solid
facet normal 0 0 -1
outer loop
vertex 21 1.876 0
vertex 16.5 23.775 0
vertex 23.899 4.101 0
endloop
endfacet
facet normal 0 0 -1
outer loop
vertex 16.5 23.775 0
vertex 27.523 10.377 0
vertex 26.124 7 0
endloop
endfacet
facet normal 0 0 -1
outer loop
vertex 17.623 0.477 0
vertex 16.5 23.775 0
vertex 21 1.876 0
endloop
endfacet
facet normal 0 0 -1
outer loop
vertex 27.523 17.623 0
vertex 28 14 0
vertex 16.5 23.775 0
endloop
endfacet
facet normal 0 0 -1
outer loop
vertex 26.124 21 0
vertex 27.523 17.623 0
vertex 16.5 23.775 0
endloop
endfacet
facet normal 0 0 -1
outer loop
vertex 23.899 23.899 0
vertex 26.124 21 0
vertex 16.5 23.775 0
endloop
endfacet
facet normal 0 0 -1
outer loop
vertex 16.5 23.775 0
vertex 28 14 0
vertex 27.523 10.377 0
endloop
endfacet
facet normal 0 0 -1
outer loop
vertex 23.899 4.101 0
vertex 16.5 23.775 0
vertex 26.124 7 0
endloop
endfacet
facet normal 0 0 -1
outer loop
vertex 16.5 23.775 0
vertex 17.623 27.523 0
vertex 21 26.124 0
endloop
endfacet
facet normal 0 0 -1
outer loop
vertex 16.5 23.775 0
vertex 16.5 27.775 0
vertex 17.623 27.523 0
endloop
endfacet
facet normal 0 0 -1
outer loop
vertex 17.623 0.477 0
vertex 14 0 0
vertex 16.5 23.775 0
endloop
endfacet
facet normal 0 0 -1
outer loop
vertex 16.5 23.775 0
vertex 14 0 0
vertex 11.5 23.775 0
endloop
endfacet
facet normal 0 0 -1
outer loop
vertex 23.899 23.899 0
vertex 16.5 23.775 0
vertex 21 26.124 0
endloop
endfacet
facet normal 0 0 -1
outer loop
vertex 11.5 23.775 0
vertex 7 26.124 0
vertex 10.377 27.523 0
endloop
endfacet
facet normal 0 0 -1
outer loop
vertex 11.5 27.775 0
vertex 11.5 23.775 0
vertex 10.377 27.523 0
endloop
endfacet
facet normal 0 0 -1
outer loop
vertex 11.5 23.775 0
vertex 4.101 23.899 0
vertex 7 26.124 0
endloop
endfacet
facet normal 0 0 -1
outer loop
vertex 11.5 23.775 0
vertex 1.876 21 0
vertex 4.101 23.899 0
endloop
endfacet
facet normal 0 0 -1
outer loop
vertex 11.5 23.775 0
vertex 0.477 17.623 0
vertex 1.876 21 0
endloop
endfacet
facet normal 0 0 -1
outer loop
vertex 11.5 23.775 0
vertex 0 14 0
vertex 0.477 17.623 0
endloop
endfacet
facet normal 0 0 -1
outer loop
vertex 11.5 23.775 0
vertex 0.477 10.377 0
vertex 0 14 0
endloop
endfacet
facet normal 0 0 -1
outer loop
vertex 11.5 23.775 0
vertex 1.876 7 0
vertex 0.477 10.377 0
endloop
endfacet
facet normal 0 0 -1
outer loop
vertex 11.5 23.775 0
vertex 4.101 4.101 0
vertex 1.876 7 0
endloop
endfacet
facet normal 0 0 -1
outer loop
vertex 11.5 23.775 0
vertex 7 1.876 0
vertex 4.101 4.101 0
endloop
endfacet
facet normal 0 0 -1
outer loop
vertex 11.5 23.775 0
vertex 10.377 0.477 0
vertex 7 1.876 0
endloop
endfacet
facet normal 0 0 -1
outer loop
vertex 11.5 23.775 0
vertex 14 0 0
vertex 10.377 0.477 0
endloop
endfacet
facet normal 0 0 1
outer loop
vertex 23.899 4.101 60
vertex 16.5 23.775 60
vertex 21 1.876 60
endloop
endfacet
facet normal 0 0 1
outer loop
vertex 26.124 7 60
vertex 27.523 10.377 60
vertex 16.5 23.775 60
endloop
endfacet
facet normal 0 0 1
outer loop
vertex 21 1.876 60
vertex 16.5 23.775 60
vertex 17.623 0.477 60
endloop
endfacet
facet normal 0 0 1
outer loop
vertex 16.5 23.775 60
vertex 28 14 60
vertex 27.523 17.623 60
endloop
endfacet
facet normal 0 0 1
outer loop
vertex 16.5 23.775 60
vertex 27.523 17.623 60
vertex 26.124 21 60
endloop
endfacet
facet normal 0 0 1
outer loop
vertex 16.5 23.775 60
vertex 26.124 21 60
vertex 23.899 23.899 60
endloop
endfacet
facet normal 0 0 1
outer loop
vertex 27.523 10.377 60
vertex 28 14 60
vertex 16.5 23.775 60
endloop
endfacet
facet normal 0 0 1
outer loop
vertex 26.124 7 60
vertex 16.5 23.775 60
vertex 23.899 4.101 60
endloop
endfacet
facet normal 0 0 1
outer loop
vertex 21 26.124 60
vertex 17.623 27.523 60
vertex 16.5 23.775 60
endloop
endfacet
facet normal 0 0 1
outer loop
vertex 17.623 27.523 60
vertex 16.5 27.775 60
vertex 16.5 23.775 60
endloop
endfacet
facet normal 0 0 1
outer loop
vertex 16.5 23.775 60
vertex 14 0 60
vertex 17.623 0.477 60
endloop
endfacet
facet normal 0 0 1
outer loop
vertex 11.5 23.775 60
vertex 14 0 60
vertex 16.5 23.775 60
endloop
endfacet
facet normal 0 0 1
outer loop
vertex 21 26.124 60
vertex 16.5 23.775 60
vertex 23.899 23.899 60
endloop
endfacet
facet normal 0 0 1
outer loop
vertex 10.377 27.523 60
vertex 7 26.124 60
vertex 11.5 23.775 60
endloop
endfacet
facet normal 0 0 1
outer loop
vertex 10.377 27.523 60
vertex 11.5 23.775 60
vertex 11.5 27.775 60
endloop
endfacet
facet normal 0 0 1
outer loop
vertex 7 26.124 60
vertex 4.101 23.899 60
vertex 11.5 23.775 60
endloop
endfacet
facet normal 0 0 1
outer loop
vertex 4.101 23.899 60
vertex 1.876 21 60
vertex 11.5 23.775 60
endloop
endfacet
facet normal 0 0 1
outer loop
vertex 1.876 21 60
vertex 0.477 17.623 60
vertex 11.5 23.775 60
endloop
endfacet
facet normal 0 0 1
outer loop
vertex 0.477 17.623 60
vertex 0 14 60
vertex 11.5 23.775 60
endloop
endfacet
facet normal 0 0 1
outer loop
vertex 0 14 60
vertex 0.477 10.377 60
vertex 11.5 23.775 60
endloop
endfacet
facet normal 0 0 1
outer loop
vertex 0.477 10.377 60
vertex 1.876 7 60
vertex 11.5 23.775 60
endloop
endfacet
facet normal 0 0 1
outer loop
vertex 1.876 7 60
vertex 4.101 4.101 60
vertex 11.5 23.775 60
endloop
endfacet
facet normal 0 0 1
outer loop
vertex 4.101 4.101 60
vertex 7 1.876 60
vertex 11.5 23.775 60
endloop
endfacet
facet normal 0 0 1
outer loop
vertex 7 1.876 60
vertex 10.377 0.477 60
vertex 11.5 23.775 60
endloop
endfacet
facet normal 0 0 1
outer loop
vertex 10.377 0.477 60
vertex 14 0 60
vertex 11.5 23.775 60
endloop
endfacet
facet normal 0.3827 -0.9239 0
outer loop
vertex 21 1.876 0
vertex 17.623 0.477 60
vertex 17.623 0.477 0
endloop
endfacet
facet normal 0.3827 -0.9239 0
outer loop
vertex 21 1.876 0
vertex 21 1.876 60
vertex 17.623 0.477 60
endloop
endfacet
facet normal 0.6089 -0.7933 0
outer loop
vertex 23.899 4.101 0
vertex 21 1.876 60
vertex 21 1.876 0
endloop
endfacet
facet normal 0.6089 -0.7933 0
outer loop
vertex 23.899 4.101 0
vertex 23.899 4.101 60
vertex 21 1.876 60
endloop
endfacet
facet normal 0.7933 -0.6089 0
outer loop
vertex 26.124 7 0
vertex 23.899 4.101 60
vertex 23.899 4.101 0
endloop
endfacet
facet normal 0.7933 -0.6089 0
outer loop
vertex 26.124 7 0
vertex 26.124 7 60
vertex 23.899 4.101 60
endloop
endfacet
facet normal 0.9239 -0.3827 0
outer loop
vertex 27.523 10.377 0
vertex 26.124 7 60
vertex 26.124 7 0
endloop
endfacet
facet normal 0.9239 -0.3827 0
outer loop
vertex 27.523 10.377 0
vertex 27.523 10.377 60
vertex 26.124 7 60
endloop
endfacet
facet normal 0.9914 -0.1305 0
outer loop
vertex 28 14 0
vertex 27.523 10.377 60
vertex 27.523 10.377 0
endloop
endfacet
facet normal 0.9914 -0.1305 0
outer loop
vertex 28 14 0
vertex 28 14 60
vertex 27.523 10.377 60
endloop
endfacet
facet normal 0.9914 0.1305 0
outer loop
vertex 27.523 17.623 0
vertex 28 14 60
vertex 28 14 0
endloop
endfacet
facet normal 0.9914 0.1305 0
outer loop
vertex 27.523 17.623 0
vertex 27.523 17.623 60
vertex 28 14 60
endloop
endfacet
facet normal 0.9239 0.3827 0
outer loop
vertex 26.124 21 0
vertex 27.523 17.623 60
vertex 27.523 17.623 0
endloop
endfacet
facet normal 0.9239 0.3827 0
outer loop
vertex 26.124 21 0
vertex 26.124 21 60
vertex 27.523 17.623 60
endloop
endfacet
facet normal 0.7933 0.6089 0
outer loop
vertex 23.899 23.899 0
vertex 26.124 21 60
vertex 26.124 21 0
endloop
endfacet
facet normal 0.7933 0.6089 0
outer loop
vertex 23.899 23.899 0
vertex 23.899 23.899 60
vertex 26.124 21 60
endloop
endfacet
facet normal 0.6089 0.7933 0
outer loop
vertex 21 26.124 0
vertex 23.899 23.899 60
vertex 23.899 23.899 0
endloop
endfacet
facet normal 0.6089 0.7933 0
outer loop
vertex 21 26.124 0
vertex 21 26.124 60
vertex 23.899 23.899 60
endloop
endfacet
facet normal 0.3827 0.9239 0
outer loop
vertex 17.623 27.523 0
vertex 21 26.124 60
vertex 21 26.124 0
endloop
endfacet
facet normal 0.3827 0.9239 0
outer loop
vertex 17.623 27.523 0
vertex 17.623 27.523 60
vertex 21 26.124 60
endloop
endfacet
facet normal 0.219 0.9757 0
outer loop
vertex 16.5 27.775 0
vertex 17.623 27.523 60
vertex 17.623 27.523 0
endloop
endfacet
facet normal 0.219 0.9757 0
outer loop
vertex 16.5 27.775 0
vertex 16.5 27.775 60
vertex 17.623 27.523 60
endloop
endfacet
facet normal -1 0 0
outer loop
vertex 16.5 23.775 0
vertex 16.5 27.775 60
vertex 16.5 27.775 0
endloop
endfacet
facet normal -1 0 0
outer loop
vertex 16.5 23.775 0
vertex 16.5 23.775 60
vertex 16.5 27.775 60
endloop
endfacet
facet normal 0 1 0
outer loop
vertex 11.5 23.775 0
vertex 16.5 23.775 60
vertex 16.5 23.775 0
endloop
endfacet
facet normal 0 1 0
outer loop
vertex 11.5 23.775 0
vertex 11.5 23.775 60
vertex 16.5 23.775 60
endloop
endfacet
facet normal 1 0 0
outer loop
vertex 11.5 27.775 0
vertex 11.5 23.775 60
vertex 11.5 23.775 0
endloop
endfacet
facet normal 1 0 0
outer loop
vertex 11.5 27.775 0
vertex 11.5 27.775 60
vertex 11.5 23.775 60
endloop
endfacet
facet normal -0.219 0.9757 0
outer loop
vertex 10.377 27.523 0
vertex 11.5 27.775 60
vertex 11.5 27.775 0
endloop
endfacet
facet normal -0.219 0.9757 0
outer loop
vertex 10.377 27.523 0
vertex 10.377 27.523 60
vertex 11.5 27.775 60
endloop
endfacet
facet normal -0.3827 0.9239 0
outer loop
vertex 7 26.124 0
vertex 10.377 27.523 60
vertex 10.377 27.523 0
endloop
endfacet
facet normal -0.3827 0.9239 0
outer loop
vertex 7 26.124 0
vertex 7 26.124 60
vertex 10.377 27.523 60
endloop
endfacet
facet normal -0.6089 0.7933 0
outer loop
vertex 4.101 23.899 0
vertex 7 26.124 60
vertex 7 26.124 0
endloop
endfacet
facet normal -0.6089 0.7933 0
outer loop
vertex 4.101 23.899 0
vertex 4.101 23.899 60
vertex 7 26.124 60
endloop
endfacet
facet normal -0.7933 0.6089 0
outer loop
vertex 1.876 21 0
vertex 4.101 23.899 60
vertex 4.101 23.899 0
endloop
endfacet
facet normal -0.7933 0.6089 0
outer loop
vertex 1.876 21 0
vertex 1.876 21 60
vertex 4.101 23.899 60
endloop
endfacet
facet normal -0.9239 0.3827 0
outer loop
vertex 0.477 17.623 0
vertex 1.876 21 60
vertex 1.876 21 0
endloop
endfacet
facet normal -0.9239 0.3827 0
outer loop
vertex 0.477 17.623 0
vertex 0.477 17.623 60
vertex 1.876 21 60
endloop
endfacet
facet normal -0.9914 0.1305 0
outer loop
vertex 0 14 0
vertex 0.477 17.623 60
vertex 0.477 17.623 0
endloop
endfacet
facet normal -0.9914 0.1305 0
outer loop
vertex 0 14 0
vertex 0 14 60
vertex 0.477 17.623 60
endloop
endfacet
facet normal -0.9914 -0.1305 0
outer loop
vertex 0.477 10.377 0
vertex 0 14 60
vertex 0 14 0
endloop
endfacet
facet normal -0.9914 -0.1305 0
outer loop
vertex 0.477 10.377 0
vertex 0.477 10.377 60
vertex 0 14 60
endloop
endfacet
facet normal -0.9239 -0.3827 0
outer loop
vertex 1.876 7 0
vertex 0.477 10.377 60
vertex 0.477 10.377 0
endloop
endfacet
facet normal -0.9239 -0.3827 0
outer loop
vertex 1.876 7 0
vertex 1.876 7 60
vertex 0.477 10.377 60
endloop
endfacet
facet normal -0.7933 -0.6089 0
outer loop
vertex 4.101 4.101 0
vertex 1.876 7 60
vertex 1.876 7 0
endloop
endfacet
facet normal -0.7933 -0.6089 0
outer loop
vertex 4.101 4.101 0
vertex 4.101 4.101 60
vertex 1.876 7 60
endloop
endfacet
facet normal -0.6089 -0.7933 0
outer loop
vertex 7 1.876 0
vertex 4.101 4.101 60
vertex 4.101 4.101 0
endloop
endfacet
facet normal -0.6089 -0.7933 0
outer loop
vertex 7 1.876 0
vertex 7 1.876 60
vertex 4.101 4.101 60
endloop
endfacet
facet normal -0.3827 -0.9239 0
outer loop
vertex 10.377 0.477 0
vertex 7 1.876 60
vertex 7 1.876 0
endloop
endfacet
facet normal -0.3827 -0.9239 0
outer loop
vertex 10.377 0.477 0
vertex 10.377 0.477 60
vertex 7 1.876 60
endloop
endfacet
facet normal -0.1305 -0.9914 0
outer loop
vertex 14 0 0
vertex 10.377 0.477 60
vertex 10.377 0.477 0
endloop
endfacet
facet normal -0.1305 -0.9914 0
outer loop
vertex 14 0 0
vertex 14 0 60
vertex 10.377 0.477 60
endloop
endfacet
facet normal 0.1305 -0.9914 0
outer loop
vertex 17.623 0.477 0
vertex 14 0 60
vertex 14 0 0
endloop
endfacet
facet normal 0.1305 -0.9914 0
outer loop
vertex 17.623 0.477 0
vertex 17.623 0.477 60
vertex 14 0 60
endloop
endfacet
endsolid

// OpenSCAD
$fn = 32;

// ----------------------------------------------------------------------
// Keyway shaft: d28 shaft, key 5 x 4 mm
// ----------------------------------------------------------------------

// --- parameters (mm) ---
shaft_r = 14;             // shaft radius
key_w = 5;                // keyway width
key_d = 4;                // keyway depth below the surface line
plate_t = 60;             // shaft length, Z (extrusion height)

shaft_d = 2 * shaft_r;  // shaft diameter
circle_step = 15;  // polygon sampling step, degrees

profile = [[10.377, 27.523], [7, 26.124], [4.101, 23.899], [1.876, 21], [0.477, 17.623], [0, 14], [0.477, 10.377], [1.876, 7], [4.101, 4.101], [7, 1.876], [10.377, 0.477], [14, 0], [17.623, 0.477], [21, 1.876], [23.899, 4.101], [26.124, 7], [27.523, 10.377], [28, 14], [27.523, 17.623], [26.124, 21], [23.899, 23.899], [21, 26.124], [17.623, 27.523], [16.5, 27.775], [16.5, 23.775], [11.5, 23.775], [11.5, 27.775]];  // primary outline, 27 points, counter clockwise

// --- the one profile operation ---
linear_extrude(height = plate_t) polygon(points = profile);
